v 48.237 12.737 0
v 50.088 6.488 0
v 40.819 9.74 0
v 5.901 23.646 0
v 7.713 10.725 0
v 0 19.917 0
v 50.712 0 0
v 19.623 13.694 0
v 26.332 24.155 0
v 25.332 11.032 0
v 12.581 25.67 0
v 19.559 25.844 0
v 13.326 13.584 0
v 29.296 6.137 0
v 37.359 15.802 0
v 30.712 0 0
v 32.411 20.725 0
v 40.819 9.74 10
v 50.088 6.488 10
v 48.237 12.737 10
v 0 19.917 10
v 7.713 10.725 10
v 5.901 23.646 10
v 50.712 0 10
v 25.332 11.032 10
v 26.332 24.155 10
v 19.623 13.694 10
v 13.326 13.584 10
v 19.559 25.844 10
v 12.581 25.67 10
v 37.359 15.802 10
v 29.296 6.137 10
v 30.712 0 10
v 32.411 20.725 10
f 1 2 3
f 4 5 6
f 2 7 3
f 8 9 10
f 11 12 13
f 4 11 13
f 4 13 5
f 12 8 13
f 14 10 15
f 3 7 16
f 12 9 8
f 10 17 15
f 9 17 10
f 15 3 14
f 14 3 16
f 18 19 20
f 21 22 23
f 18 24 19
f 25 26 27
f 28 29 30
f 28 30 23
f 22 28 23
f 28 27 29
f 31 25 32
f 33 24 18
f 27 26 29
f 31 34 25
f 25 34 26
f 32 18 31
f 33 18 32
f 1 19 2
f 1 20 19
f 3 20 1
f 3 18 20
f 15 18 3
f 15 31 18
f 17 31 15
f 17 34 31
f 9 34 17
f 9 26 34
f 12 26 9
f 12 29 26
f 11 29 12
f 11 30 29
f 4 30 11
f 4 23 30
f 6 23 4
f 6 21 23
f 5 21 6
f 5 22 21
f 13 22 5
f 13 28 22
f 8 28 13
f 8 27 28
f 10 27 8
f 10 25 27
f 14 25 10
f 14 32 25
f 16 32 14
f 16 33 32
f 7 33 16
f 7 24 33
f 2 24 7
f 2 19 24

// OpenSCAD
$fn = 32;

// ----------------------------------------------------------------------
// Arc stop: segment, 10 mm thick
// ----------------------------------------------------------------------

// --- parameters (mm) ---
profile_height = 10;      // extrusion height
profile_points = 17;      // points of the closed outline

profile = [[50.712, 0], [50.088, 6.488], [48.237, 12.737], [40.819, 9.74], [37.359, 15.802], [32.411, 20.725], [26.332, 24.155], [19.559, 25.844], [12.581, 25.67], [5.901, 23.646], [0, 19.917], [7.713, 10.725], [13.326, 13.584], [19.623, 13.694], [25.332, 11.032], [29.296, 6.137], [30.712, 0]];  // single closed polygon, 17 points, counter clockwise

// --- the one profile operation ---
linear_extrude(height = profile_height) polygon(points = profile);
